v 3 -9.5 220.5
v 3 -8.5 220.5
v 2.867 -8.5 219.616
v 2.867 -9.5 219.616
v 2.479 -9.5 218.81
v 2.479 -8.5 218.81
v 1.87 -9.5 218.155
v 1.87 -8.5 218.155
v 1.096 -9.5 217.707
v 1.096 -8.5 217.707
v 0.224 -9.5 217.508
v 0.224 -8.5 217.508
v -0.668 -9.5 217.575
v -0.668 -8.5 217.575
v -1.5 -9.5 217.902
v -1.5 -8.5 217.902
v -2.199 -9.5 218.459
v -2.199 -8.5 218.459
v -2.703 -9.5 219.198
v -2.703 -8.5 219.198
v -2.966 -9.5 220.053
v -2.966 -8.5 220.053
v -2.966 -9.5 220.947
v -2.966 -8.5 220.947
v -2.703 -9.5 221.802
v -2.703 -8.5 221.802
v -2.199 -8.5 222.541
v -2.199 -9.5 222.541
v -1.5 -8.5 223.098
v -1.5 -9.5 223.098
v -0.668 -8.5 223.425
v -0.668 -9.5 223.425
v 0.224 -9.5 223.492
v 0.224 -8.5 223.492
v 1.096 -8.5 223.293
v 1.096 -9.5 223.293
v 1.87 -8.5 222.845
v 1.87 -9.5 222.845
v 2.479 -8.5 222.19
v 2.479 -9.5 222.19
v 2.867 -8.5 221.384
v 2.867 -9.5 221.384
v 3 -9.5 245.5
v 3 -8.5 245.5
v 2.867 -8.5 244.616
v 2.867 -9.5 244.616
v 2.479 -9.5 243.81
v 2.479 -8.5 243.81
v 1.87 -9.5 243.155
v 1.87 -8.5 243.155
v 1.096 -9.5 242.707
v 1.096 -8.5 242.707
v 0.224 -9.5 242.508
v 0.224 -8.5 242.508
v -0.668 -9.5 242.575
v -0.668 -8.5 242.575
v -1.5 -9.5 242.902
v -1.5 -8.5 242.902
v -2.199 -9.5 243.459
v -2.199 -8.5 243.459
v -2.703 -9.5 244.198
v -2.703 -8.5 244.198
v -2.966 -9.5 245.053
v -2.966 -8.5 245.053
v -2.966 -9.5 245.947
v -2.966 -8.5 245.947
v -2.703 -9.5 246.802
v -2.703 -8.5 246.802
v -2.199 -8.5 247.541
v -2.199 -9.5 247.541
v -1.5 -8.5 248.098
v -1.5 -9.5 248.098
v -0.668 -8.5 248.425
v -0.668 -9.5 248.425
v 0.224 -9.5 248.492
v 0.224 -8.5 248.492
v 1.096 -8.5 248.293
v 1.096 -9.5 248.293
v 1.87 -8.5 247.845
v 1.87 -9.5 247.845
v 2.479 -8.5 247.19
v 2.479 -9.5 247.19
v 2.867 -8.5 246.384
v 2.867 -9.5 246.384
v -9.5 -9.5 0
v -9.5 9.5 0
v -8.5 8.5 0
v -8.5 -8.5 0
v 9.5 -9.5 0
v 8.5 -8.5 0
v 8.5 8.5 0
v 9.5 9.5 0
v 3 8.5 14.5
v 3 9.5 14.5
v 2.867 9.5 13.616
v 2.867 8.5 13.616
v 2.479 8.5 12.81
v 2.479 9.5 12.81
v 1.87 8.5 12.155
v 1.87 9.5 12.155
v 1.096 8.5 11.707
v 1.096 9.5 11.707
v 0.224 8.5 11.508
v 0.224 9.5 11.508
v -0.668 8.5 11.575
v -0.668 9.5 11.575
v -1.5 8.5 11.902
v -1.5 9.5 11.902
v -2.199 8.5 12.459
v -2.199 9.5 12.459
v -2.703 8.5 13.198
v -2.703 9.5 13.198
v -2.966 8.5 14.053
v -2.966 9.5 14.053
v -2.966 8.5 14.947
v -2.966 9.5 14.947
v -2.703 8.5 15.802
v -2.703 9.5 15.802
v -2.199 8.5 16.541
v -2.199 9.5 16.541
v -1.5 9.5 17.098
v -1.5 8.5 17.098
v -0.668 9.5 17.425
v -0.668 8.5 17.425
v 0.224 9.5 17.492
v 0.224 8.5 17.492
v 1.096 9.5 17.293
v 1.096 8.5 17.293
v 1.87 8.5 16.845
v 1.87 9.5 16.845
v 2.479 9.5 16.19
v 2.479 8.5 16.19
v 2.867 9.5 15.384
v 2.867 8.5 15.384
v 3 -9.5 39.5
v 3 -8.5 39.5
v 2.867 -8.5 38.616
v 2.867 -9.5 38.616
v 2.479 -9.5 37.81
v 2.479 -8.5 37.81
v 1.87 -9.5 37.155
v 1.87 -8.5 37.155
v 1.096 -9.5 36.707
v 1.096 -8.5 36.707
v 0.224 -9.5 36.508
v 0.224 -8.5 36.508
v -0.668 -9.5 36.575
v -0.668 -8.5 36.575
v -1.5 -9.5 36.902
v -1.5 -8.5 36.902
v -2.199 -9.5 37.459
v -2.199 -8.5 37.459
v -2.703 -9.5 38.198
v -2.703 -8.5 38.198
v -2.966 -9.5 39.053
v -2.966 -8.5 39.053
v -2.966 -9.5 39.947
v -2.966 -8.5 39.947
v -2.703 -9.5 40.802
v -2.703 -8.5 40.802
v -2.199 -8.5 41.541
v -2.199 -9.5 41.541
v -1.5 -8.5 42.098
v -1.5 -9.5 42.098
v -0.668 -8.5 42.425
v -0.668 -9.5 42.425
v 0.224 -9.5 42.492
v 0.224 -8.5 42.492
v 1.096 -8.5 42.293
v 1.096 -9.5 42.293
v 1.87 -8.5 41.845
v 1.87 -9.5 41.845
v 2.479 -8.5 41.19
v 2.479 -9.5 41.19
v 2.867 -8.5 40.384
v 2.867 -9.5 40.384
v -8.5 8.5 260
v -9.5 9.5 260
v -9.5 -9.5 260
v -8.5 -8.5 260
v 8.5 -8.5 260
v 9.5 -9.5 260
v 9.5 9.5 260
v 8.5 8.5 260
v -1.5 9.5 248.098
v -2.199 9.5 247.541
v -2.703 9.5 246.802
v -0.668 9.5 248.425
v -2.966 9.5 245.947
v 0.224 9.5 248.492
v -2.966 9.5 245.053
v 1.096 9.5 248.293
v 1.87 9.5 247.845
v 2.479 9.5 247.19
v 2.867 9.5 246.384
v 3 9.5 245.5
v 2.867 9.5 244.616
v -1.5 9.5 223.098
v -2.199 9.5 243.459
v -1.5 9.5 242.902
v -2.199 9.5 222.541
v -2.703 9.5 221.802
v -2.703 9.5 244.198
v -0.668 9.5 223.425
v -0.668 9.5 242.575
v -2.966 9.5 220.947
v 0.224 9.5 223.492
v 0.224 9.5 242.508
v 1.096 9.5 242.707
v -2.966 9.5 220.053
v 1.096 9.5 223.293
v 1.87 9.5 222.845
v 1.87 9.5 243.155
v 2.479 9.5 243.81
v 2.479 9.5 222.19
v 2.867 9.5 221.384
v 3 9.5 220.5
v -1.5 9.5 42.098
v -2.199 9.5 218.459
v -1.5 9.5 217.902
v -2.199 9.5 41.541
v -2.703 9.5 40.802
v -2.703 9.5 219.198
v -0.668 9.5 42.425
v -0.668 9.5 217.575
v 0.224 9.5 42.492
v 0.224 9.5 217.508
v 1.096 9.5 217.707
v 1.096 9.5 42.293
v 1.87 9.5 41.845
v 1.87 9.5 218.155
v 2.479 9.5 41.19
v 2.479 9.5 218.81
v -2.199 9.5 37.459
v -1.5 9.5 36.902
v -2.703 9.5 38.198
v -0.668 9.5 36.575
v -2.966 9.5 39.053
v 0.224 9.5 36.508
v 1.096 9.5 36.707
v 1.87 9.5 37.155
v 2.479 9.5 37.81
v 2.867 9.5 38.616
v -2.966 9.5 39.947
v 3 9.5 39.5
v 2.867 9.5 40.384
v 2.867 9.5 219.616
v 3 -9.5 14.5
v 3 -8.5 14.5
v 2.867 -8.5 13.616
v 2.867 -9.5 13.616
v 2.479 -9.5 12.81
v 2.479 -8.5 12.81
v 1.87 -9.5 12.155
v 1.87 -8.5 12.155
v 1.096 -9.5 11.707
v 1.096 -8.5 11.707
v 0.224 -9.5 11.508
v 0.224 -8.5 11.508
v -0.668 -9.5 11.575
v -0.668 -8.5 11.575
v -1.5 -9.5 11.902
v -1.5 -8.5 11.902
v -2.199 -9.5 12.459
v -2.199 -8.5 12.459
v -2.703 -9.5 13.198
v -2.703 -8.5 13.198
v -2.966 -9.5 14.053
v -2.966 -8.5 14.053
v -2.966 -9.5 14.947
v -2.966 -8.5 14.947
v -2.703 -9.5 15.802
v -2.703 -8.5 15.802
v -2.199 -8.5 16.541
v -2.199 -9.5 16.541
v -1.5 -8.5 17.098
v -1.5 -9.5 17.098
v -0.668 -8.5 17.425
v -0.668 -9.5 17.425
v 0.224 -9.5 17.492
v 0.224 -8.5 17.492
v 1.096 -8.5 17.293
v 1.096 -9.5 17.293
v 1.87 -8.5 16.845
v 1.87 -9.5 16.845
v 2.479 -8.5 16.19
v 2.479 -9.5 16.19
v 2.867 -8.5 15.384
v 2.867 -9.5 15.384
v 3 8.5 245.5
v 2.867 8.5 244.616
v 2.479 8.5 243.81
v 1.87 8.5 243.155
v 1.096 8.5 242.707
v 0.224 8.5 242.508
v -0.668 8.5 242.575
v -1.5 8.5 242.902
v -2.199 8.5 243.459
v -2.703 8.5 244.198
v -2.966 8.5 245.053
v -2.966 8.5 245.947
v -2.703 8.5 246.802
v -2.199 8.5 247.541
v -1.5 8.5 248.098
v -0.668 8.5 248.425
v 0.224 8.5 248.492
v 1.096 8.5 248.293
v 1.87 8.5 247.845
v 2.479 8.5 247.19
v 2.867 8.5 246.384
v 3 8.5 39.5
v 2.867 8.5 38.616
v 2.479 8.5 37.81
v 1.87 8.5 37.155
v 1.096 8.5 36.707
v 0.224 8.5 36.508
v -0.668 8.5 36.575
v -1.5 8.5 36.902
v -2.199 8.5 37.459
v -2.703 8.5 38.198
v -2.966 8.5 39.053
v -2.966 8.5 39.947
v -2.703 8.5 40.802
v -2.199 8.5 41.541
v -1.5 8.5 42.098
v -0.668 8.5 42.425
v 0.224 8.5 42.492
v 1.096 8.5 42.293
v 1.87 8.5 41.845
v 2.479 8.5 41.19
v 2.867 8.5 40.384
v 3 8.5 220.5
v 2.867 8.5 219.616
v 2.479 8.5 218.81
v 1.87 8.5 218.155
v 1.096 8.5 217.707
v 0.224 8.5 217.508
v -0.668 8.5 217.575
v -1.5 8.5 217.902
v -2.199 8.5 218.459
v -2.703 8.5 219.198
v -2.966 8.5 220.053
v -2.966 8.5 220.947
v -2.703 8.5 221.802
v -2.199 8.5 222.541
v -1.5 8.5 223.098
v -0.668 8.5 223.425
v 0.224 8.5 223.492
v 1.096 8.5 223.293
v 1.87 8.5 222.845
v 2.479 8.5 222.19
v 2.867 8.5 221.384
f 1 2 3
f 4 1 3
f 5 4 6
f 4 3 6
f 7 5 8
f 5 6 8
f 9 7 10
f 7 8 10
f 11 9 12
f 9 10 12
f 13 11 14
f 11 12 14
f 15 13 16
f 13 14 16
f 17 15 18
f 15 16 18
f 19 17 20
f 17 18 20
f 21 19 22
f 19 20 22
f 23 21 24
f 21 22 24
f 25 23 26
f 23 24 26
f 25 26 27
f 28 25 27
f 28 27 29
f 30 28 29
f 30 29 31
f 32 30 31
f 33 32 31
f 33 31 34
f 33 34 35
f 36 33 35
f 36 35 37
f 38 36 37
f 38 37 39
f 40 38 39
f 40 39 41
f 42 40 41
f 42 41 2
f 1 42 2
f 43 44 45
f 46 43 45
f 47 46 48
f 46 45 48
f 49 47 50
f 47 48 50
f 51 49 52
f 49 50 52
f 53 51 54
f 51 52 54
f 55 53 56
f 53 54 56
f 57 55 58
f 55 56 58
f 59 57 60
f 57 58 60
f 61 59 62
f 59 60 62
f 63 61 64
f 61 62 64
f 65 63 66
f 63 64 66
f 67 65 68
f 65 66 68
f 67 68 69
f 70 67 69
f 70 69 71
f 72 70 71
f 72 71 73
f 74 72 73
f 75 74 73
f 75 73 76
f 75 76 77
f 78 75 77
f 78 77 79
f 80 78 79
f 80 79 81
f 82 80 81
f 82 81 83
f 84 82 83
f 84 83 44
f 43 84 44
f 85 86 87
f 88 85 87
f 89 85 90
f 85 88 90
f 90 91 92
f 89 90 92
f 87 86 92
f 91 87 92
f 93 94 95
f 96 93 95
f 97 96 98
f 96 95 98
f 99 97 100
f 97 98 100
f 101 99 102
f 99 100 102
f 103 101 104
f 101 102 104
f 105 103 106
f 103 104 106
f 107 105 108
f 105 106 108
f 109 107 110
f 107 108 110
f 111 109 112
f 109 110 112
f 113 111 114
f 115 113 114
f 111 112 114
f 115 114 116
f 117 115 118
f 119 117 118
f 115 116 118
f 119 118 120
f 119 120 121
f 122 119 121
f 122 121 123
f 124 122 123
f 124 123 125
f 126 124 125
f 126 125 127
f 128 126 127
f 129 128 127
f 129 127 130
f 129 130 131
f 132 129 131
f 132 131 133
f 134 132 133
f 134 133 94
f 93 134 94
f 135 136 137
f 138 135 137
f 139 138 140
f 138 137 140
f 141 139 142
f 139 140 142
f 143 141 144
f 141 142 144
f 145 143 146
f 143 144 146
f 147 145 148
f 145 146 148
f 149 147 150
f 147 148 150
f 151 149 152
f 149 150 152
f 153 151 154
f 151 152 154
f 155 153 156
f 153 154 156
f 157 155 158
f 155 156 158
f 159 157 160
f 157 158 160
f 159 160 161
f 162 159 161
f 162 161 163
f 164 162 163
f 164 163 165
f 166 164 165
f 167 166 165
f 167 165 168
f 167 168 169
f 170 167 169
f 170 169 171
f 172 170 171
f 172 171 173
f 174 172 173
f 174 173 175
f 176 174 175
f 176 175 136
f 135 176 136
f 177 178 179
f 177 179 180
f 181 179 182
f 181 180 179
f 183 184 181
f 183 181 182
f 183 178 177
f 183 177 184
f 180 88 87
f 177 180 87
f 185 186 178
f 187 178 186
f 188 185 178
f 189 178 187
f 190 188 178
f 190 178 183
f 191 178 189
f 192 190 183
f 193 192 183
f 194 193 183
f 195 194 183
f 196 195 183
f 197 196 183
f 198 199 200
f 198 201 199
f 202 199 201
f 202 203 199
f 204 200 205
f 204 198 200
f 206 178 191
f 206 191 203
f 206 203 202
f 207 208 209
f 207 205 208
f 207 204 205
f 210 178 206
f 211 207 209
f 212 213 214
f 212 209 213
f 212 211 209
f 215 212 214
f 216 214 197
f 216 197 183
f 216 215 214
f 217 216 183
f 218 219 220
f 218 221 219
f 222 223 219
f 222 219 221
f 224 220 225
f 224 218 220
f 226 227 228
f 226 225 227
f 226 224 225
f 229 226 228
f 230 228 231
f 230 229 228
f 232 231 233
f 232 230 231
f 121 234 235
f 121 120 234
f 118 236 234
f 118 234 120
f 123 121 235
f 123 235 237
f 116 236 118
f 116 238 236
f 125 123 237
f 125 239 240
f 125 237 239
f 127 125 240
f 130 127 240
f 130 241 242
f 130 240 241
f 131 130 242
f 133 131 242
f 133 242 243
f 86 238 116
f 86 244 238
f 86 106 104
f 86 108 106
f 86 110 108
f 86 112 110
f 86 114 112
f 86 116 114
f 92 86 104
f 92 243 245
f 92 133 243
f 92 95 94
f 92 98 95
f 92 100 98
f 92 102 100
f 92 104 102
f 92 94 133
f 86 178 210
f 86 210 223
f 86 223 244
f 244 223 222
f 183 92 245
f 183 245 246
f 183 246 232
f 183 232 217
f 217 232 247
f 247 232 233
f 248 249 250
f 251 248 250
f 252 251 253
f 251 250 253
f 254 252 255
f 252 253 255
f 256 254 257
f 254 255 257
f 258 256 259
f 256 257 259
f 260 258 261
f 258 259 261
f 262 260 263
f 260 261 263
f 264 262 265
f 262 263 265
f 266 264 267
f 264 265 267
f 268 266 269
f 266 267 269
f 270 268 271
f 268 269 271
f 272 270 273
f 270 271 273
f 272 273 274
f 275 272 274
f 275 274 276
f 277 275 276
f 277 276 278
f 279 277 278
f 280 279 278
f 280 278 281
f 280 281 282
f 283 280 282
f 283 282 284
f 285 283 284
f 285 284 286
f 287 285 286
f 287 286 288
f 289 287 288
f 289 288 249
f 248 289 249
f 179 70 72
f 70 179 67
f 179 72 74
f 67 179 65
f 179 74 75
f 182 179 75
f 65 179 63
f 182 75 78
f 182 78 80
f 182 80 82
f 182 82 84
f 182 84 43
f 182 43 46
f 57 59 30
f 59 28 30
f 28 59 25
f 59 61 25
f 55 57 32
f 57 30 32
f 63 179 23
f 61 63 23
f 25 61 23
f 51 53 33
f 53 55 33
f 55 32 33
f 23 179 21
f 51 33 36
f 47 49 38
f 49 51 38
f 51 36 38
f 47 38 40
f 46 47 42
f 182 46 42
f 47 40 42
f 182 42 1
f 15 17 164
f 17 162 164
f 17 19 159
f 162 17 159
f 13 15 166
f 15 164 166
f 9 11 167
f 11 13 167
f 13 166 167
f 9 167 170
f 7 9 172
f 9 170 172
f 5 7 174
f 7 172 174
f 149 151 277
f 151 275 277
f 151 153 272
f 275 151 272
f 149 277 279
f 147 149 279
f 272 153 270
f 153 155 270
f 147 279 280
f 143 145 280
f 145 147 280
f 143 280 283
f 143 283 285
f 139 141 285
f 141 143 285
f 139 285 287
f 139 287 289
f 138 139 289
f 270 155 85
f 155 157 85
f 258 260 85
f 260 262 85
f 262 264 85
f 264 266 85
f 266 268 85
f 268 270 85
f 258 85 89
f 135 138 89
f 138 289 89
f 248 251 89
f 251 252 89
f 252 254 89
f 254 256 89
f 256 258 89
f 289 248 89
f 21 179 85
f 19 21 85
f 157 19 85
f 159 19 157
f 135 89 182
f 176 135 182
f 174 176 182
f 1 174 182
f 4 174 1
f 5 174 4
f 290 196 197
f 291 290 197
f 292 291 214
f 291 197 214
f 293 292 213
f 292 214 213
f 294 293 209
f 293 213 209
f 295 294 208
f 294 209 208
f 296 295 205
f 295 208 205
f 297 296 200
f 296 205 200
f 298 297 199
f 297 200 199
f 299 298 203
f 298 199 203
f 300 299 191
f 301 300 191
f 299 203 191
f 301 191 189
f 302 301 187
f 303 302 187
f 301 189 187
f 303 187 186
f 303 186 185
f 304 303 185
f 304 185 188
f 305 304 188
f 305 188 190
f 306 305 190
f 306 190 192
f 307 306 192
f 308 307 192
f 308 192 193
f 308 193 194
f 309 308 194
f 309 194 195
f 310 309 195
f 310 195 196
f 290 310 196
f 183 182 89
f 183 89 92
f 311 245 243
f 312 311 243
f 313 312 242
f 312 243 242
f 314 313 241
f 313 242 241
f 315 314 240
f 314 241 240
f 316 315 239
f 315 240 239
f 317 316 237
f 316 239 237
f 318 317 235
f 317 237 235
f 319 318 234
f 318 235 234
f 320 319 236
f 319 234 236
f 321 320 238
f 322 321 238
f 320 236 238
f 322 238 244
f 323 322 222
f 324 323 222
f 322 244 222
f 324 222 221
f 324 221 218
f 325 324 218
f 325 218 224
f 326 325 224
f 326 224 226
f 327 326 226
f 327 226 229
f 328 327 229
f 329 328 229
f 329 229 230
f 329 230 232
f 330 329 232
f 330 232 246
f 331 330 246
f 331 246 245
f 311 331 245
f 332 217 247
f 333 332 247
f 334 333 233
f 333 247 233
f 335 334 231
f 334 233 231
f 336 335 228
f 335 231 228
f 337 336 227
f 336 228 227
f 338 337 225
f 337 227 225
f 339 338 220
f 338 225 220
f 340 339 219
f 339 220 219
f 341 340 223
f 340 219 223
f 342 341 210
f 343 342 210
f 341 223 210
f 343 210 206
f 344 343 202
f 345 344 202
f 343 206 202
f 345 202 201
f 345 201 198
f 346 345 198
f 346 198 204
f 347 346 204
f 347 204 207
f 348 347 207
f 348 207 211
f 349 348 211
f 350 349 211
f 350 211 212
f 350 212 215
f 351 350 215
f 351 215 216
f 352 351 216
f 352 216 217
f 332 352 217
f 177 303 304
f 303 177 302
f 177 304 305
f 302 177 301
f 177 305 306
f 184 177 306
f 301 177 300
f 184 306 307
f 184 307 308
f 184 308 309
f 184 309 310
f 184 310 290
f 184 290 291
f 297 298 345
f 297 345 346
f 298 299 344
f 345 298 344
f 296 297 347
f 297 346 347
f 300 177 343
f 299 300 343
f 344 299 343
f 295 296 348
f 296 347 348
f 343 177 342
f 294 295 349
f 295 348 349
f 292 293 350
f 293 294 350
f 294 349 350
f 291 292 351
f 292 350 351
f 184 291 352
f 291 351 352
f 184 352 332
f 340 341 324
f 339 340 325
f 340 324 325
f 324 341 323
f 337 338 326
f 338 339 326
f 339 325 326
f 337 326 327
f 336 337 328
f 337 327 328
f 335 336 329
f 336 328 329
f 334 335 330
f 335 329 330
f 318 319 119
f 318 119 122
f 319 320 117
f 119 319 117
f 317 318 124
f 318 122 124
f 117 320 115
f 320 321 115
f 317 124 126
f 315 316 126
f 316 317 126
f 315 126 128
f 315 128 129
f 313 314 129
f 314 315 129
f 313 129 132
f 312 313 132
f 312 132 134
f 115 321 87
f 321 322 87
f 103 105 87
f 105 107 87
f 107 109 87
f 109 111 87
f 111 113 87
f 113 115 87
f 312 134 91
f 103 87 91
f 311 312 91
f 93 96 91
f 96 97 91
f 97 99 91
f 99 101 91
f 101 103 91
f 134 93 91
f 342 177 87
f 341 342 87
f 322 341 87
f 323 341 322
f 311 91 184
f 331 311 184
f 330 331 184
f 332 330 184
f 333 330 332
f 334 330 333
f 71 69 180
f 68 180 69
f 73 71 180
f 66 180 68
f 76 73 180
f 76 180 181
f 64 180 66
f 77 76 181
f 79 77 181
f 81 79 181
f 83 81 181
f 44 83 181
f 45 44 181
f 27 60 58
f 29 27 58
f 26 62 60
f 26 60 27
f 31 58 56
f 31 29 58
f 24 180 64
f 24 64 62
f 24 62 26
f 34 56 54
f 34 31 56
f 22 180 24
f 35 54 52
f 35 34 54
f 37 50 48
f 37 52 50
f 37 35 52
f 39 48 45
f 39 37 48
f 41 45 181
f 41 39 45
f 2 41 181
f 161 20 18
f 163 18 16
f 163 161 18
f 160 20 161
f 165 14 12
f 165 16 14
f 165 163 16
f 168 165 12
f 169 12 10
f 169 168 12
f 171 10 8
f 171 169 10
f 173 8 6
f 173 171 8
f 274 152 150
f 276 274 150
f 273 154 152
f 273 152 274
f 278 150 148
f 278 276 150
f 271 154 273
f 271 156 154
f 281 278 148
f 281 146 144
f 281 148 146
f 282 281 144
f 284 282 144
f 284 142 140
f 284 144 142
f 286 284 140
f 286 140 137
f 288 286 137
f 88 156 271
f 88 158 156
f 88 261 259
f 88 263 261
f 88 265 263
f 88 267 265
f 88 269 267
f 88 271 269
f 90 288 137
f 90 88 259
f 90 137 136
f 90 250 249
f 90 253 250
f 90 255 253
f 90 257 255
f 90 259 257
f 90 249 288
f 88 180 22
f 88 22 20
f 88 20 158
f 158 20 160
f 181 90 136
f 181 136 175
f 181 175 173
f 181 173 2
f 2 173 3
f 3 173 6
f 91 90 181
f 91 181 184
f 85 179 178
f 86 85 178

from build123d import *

# Parameters (mm, degrees)
ESBO_O1_W                = 19
ESBO_O1_H                = 19
RESSALTO_EXTRUS_O1_DEPTH = 260
CASCA2_T                 = -1
ESBO_O2_R                = 3
CORTE_EXTRUS_O1_DEPTH    = 20


with BuildPart() as part:
    # Esboço1 → Ressalto-extrusão1 (new body)
    with BuildSketch(Plane.XY):
        Rectangle(ESBO_O1_W, ESBO_O1_H)
    extrude(amount=RESSALTO_EXTRUS_O1_DEPTH)

    # Casca2
    casca2_openings = [part.faces().sort_by_distance(p)[0] for p in [
        (0, 0, 260),
        (0, 0, 0),
    ]]
    offset(amount=CASCA2_T, openings=casca2_openings, kind=Kind.INTERSECTION)

    # Esboço2 → Corte-extrusão1 (cut, through all)
    with BuildSketch(Plane(origin=(0, 9.5, 0), x_dir=(1, 0, 0), z_dir=(0, 1, 0))):
        with Locations((0, -220.5)):
            Circle(ESBO_O2_R)
        with Locations((0, -245.5)):
            Circle(ESBO_O2_R)
        with Locations((0, -14.5)):
            Circle(ESBO_O2_R)
        with Locations((0, -39.5)):
            Circle(ESBO_O2_R)
    extrude(amount=-CORTE_EXTRUS_O1_DEPTH, mode=Mode.SUBTRACT)


solid = part.part
